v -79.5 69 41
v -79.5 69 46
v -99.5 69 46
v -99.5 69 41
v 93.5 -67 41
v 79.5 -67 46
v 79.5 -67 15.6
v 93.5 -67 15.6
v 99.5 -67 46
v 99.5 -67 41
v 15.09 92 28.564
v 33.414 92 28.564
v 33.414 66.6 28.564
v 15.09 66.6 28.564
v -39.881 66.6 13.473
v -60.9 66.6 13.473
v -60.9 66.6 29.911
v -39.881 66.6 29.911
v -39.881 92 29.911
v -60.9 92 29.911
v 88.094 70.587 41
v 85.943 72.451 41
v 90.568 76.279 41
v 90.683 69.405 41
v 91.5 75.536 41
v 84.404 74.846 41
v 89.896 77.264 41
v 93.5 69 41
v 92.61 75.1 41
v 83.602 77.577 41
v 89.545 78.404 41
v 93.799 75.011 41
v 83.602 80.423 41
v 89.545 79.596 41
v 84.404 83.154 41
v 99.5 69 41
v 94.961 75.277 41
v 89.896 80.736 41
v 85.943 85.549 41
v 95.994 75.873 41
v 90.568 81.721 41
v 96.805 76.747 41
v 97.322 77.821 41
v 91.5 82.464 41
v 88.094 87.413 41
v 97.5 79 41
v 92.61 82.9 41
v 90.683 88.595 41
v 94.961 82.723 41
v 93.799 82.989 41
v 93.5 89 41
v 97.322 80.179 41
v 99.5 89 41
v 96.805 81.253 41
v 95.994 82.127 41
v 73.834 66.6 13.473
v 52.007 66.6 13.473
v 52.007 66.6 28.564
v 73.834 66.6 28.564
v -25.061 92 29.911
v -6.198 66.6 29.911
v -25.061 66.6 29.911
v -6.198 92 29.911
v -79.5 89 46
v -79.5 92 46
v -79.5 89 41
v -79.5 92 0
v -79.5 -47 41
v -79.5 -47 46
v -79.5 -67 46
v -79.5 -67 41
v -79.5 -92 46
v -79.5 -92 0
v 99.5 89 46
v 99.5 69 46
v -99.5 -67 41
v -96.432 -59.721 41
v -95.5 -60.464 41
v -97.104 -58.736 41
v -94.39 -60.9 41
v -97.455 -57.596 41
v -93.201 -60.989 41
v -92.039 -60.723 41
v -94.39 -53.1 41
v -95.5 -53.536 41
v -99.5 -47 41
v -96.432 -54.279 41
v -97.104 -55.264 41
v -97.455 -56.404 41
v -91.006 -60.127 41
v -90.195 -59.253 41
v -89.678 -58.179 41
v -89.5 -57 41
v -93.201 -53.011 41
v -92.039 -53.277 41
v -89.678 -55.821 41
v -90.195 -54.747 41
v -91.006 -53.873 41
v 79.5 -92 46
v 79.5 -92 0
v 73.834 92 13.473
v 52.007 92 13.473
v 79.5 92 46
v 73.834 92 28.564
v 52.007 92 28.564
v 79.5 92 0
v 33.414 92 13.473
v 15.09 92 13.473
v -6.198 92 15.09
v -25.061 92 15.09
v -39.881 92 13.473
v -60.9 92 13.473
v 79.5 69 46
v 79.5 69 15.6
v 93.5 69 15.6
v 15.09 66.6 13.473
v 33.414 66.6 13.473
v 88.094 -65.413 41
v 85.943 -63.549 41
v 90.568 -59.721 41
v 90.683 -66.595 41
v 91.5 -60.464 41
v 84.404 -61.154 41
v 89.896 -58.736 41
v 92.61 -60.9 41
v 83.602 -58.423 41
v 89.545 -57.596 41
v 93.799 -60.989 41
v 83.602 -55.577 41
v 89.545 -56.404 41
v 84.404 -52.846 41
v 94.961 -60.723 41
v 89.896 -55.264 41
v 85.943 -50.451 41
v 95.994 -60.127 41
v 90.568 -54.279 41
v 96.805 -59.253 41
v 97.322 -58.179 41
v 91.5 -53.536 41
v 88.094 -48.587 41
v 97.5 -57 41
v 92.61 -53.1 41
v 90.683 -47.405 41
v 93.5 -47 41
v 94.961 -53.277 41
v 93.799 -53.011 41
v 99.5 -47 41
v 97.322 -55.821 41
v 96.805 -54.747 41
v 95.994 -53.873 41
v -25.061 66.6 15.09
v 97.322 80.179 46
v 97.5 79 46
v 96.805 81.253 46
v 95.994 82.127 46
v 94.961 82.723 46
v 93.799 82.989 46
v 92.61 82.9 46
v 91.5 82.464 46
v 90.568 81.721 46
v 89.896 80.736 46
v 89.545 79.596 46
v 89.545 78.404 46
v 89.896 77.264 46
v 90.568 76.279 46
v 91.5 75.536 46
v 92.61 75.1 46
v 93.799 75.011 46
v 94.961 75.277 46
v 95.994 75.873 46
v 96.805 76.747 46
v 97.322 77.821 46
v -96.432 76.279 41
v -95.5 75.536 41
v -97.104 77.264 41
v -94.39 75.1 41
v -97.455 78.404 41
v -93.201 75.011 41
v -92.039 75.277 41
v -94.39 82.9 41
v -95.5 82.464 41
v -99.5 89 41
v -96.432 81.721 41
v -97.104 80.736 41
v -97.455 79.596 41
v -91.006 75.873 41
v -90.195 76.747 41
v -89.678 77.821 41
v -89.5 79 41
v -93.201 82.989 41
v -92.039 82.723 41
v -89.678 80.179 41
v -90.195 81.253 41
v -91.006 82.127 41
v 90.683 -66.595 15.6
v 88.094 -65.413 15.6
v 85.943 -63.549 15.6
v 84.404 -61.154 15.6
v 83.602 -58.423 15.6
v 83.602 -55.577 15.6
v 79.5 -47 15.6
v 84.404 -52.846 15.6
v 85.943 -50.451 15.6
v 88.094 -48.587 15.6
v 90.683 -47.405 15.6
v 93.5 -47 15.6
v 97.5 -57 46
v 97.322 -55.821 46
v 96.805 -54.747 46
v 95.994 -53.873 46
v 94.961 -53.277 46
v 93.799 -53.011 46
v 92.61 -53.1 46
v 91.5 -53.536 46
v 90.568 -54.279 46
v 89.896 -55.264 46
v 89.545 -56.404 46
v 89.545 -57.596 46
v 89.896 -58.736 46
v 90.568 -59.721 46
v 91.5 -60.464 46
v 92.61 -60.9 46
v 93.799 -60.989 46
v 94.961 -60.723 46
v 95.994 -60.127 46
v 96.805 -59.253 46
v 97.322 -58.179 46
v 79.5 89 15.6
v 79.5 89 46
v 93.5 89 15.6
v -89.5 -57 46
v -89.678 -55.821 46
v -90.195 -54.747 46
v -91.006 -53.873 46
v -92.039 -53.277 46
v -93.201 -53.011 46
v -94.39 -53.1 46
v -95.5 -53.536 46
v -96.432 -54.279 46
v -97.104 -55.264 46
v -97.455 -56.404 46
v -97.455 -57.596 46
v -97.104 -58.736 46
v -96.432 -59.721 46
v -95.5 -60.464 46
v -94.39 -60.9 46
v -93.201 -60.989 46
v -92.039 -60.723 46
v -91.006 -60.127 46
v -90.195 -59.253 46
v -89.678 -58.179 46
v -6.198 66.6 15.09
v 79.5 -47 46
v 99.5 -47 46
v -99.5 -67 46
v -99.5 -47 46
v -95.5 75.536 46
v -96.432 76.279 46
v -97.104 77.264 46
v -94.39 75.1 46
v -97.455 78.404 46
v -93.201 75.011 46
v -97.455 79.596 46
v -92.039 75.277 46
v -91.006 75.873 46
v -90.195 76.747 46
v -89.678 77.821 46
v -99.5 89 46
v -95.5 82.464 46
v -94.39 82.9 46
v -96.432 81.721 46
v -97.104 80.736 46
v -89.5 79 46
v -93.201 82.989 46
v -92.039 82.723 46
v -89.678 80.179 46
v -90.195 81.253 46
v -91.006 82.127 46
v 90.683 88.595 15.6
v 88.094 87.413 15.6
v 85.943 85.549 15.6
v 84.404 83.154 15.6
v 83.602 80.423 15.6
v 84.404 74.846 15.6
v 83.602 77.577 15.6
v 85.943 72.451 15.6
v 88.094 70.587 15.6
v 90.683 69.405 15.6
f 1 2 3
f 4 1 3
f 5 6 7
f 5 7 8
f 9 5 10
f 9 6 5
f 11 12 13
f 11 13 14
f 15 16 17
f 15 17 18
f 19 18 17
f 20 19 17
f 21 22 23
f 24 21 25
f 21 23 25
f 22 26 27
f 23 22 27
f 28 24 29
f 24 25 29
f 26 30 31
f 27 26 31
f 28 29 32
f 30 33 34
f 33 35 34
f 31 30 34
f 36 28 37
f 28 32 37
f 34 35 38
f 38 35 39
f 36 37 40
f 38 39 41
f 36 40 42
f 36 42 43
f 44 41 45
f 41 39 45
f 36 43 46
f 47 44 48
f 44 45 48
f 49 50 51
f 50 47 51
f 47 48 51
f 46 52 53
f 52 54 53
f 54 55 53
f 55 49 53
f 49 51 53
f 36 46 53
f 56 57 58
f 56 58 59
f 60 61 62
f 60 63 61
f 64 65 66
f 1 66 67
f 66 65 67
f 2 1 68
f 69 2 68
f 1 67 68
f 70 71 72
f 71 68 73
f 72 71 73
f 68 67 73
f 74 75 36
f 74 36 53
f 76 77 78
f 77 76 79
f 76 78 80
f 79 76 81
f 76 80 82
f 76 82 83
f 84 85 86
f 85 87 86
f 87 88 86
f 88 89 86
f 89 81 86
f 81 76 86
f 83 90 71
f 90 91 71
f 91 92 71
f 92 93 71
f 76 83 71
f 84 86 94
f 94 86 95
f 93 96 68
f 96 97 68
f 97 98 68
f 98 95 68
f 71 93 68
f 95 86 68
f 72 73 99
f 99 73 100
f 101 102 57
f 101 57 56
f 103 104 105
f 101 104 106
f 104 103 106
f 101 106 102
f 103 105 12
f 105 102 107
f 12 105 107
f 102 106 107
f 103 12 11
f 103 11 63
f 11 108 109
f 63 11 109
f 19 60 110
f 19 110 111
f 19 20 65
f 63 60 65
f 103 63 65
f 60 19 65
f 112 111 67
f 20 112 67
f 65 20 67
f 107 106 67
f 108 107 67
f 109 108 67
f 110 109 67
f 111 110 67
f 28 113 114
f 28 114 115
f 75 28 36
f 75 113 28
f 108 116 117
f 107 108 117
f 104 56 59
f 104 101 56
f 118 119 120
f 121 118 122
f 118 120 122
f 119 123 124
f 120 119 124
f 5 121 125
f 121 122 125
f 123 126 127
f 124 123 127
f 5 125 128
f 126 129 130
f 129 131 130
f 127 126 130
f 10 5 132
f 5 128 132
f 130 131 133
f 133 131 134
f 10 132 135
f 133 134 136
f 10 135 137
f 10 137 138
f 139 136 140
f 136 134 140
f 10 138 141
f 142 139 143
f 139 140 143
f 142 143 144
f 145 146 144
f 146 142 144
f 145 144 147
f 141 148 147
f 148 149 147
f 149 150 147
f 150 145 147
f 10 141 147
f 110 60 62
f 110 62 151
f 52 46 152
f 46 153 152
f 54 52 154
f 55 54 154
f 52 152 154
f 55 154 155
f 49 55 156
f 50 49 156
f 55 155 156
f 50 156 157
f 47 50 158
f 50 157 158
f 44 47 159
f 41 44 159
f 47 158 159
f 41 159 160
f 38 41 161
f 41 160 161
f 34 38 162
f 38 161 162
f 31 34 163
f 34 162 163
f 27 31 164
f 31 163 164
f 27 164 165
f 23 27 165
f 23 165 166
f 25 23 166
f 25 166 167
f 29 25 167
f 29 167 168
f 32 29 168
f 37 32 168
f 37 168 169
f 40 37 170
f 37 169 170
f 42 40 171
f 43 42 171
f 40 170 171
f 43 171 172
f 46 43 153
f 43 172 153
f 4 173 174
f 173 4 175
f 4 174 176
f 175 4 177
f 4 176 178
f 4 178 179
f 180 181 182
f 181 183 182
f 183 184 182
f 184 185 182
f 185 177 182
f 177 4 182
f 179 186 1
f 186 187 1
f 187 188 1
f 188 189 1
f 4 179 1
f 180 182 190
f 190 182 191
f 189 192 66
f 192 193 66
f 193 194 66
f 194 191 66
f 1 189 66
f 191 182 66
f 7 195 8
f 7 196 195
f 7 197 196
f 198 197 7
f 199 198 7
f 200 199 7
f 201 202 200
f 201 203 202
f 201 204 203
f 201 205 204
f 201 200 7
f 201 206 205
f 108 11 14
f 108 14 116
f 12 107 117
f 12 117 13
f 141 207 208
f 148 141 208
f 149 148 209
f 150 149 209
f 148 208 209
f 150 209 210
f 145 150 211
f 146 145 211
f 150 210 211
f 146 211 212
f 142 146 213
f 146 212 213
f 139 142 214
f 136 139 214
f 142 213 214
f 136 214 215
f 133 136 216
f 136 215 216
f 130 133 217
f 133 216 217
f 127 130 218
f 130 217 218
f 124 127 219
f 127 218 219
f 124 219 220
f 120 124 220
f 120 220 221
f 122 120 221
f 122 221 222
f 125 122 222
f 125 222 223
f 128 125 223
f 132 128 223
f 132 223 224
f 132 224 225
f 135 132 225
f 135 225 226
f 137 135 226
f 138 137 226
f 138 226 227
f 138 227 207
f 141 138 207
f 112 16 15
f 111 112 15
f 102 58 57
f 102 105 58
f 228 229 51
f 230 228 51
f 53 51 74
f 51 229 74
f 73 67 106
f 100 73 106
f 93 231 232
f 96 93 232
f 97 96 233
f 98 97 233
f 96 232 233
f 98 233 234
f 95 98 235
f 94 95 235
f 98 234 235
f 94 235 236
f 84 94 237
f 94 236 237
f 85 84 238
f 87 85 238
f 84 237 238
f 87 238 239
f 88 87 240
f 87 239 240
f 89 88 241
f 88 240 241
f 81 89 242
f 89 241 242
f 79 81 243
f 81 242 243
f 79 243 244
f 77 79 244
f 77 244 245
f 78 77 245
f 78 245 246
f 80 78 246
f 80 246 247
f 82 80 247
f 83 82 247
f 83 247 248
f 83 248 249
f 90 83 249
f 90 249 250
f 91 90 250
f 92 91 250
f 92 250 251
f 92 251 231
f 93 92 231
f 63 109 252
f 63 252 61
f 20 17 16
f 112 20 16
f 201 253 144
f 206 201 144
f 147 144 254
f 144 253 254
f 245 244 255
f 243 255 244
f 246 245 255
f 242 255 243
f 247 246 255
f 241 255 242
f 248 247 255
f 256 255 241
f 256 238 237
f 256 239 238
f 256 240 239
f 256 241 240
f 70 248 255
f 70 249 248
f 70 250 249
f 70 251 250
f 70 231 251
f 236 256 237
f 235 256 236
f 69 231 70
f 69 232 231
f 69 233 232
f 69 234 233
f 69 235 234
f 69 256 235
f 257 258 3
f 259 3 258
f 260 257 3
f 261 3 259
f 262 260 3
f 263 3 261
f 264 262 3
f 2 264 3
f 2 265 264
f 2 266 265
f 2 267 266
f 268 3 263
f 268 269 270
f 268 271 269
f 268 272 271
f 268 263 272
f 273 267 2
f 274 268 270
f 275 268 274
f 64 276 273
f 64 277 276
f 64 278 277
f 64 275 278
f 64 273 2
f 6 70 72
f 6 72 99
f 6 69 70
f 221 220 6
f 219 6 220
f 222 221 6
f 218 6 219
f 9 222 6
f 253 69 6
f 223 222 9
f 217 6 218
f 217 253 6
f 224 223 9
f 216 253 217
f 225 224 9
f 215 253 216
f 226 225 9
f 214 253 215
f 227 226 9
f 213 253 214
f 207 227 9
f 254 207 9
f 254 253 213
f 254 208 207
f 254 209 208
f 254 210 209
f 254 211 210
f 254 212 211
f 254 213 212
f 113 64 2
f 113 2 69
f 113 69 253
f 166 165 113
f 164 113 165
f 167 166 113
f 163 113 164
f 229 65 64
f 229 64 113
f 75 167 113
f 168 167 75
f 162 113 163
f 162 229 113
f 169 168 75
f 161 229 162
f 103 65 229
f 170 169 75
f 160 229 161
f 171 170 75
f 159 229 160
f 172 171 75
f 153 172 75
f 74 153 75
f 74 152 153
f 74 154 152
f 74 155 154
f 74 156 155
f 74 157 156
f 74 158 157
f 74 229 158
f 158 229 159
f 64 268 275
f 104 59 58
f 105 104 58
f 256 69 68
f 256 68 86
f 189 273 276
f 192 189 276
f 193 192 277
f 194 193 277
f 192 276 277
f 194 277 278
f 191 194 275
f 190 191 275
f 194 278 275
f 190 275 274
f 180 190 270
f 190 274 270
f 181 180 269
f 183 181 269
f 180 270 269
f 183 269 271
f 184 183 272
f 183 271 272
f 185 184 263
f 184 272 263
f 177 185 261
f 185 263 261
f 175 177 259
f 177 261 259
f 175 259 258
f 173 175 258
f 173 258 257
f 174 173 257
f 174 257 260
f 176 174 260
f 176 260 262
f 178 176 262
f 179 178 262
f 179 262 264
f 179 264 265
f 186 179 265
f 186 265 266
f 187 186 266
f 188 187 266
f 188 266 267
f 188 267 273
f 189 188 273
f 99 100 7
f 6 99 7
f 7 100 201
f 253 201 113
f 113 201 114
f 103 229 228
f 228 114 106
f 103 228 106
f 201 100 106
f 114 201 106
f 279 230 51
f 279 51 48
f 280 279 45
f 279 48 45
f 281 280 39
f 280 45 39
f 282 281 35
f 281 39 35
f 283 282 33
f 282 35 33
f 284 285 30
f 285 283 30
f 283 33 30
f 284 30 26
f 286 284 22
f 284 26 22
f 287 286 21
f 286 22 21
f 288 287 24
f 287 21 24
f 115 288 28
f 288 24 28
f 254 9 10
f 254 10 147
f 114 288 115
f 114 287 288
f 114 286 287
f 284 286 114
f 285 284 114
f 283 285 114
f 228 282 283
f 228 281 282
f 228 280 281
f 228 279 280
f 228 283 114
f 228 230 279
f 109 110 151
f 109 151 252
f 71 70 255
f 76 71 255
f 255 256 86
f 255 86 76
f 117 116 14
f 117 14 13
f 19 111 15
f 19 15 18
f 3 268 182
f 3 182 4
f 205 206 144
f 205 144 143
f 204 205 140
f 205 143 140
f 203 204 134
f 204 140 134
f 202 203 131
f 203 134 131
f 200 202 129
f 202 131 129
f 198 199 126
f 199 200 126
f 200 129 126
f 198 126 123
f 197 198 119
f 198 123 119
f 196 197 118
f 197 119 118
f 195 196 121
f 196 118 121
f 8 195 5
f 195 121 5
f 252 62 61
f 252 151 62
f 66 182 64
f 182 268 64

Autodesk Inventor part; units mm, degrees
ref_plane "YZ Plane" through (0, 0, 0) normal (1, 0, 0) x (0, 1, 0)
ref_plane "XZ Plane" through (0, 0, 0) normal (0, 1, 0) x (-1, 0, 0)
ref_plane "XY Plane" through (0, 0, 0) normal (0, 0, 1) x (1, 0, 0)
sketch "Sketch1" plane through (0, 0, 0) normal (0, 0, 1) x (1, 0, 0)
  line L0 (-79.5, -92) -> (79.5, -92)
  line L1 (79.5, -92) -> (79.5, 92)
  line L2 (79.5, 92) -> (-79.5, 92)
  line L3 (-79.5, 92) -> (-79.5, -92)
  line L4 (-79.5, -92) -> (79.5, 92) construction
  line L5 (79.5, -92) -> (-79.5, 92) construction
  point P0 (0, 0)
  dimension "d0" = 159
  dimension "d1" = 184
extrude "Extrusion1" add sketch "Sketch1" along normal blind 46
sketch "Sketch2" plane through (0, 0, 46) normal (0, 0, 1) x (1, 0, 0)
  line L0 (-79.5, 92) -> (-79.5, -92) projected
  line L1 (79.5, -92) -> (79.5, 92) projected
  line L2 (-79.5, 92) -> (-99.5, 92)
  line L3 (-99.5, 92) -> (-99.5, -92)
  line L4 (-99.5, -92) -> (-79.5, -92)
  line L5 (79.5, -92) -> (99.5, -92)
  line L6 (99.5, -92) -> (99.5, 92)
  line L7 (99.5, 92) -> (79.5, 92)
  point P0 (0, 0)
  dimension "d4" = 20
extrude "Extrusion2" add sketch "Sketch2" against normal blind 5
sketch "Sketch3" plane through (-79.5, 92, 0) normal (0, 1, 0) x (1, 0, 0)
  line L0 (18.6001, -13.4734) -> (39.6187, -13.4734)
  line L1 (39.6187, -13.4734) -> (39.6187, -29.911)
  line L2 (39.6187, -29.911) -> (18.6001, -29.911)
  line L3 (18.6001, -29.911) -> (18.6001, -13.4734)
  line L4 (54.4394, -15.0902) -> (73.3022, -15.0902)
  line L5 (73.3022, -15.0902) -> (73.3022, -29.911)
  line L6 (73.3022, -29.911) -> (54.4394, -29.911)
  line L7 (54.4394, -29.911) -> (54.4394, -15.0902)
  line L8 (94.5902, -13.4734) -> (112.9141, -13.4734)
  line L9 (112.9141, -13.4734) -> (112.9141, -28.5637)
  line L10 (112.9141, -28.5637) -> (94.5902, -28.5637)
  line L11 (94.5902, -28.5637) -> (94.5902, -13.4734)
  line L12 (131.5074, -13.4734) -> (153.3344, -13.4734)
  line L13 (153.3344, -13.4734) -> (153.3344, -28.5637)
  line L14 (153.3344, -28.5637) -> (131.5074, -28.5637)
  line L15 (131.5074, -28.5637) -> (131.5074, -13.4734)
  point P0 (79.5, 0)
extrude "Extrusion3" cut sketch "Sketch3" against normal blind 25.4
sketch "Sketch4" plane through (0, 0, 46) normal (0, 0, 1) x (1, 0, 0)
  circle A0 centre (-93.5, 79) radius 4
  circle A1 centre (93.5, 79) radius 4
  circle A2 centre (93.5, -57) radius 4
  circle A3 centre (-93.5, -57) radius 4
  line L0 (-99.5, 92) -> (99.5, 92) projected
  line L1 (-99.5, -92) -> (-99.5, 92) projected
  line L2 (99.5, 92) -> (99.5, -92) projected
  line L3 (93.5, 79) -> (-93.5, 79) construction
  line L4 (93.5, 79) -> (93.5, -57) construction
  line L5 (-93.5, -57) -> (-93.5, 79) construction
  line L6 (-99.5, 92) -> (-93.5, 79) construction
  line L7 (93.5, 79) -> (99.5, 92) construction
  line L8 (79.5, 92) -> (79.5, -92) projected
  line L9 (-79.5, -92) -> (-79.5, 92) projected
  line L10 (79.5, 69) -> (99.5, 69)
  line L11 (79.5, -47) -> (99.5, -47)
  line L12 (79.5, -67) -> (99.5, -67)
  line L13 (99.5, -92) -> (79.5, -92)
  line L14 (-79.5, -92) -> (-99.5, -92)
  line L15 (-79.5, -67) -> (-99.5, -67)
  line L16 (-79.5, -47) -> (-99.5, -47)
  line L17 (-79.5, 69) -> (-99.5, 69)
  line L18 (79.5, 89) -> (99.5, 89)
  line L19 (-99.5, 89) -> (-79.5, 89)
  point P0 (0, 0)
  dimension "d9" = 13
  dimension "d10" = 8
  dimension "d11" = 149
  dimension "d12" = 187
  dimension "d13" = 23
  dimension "d14" = 139
  dimension "d15" = 159
  dimension "d22" = 3
extrude "Extrusion4" cut sketch "Sketch4" against normal up to surface (5 mm away) contours A0 | A1 | A2 | A3 | L0 L2 L18 L8 | L0 L9 L19 L1 | L17 L9 L16 L1 | L10 L2 L11 L8 | L15 L9 L14 L1 | L12 L2 L13 L8
sketch "Sketch5" plane through (0, 0, 41) normal (0, 0, -1) x (-1, 0, 0)
  circle A0 centre (-93.5, 79) radius 4 projected
  line L0 (-79.5, 89) -> (-79.5, 69) projected
  line L1 (-99.5, 69) -> (-79.5, 69) projected
  line L2 (-79.5, -47) -> (-99.5, -47) projected
  line L3 (-79.5, -47) -> (-79.5, -67) projected
  line L4 (-99.5, -67) -> (-79.5, -67) projected
  circle A1 centre (-93.5, -57) radius 4 projected
  line L5 (-79.5, 89) -> (-99.5, 89) projected
  line L6 (-93.5, 89) -> (-93.5, 69) construction
  arc A2 (-93.5, 69) -> (-93.5, 89) centre (-93.5, 79) ccw
  line L7 (-93.5, -47) -> (-93.5, -67) construction
  arc A3 (-93.5, -67) -> (-93.5, -47) centre (-93.5, -57) ccw
  point P0 (0, 0)
extrude "Extrusion5" add sketch "Sketch5" along normal blind 25.4 contours L0 L1 A2 L5 | L3 L4 A3 L2
properties part number "MCM"
